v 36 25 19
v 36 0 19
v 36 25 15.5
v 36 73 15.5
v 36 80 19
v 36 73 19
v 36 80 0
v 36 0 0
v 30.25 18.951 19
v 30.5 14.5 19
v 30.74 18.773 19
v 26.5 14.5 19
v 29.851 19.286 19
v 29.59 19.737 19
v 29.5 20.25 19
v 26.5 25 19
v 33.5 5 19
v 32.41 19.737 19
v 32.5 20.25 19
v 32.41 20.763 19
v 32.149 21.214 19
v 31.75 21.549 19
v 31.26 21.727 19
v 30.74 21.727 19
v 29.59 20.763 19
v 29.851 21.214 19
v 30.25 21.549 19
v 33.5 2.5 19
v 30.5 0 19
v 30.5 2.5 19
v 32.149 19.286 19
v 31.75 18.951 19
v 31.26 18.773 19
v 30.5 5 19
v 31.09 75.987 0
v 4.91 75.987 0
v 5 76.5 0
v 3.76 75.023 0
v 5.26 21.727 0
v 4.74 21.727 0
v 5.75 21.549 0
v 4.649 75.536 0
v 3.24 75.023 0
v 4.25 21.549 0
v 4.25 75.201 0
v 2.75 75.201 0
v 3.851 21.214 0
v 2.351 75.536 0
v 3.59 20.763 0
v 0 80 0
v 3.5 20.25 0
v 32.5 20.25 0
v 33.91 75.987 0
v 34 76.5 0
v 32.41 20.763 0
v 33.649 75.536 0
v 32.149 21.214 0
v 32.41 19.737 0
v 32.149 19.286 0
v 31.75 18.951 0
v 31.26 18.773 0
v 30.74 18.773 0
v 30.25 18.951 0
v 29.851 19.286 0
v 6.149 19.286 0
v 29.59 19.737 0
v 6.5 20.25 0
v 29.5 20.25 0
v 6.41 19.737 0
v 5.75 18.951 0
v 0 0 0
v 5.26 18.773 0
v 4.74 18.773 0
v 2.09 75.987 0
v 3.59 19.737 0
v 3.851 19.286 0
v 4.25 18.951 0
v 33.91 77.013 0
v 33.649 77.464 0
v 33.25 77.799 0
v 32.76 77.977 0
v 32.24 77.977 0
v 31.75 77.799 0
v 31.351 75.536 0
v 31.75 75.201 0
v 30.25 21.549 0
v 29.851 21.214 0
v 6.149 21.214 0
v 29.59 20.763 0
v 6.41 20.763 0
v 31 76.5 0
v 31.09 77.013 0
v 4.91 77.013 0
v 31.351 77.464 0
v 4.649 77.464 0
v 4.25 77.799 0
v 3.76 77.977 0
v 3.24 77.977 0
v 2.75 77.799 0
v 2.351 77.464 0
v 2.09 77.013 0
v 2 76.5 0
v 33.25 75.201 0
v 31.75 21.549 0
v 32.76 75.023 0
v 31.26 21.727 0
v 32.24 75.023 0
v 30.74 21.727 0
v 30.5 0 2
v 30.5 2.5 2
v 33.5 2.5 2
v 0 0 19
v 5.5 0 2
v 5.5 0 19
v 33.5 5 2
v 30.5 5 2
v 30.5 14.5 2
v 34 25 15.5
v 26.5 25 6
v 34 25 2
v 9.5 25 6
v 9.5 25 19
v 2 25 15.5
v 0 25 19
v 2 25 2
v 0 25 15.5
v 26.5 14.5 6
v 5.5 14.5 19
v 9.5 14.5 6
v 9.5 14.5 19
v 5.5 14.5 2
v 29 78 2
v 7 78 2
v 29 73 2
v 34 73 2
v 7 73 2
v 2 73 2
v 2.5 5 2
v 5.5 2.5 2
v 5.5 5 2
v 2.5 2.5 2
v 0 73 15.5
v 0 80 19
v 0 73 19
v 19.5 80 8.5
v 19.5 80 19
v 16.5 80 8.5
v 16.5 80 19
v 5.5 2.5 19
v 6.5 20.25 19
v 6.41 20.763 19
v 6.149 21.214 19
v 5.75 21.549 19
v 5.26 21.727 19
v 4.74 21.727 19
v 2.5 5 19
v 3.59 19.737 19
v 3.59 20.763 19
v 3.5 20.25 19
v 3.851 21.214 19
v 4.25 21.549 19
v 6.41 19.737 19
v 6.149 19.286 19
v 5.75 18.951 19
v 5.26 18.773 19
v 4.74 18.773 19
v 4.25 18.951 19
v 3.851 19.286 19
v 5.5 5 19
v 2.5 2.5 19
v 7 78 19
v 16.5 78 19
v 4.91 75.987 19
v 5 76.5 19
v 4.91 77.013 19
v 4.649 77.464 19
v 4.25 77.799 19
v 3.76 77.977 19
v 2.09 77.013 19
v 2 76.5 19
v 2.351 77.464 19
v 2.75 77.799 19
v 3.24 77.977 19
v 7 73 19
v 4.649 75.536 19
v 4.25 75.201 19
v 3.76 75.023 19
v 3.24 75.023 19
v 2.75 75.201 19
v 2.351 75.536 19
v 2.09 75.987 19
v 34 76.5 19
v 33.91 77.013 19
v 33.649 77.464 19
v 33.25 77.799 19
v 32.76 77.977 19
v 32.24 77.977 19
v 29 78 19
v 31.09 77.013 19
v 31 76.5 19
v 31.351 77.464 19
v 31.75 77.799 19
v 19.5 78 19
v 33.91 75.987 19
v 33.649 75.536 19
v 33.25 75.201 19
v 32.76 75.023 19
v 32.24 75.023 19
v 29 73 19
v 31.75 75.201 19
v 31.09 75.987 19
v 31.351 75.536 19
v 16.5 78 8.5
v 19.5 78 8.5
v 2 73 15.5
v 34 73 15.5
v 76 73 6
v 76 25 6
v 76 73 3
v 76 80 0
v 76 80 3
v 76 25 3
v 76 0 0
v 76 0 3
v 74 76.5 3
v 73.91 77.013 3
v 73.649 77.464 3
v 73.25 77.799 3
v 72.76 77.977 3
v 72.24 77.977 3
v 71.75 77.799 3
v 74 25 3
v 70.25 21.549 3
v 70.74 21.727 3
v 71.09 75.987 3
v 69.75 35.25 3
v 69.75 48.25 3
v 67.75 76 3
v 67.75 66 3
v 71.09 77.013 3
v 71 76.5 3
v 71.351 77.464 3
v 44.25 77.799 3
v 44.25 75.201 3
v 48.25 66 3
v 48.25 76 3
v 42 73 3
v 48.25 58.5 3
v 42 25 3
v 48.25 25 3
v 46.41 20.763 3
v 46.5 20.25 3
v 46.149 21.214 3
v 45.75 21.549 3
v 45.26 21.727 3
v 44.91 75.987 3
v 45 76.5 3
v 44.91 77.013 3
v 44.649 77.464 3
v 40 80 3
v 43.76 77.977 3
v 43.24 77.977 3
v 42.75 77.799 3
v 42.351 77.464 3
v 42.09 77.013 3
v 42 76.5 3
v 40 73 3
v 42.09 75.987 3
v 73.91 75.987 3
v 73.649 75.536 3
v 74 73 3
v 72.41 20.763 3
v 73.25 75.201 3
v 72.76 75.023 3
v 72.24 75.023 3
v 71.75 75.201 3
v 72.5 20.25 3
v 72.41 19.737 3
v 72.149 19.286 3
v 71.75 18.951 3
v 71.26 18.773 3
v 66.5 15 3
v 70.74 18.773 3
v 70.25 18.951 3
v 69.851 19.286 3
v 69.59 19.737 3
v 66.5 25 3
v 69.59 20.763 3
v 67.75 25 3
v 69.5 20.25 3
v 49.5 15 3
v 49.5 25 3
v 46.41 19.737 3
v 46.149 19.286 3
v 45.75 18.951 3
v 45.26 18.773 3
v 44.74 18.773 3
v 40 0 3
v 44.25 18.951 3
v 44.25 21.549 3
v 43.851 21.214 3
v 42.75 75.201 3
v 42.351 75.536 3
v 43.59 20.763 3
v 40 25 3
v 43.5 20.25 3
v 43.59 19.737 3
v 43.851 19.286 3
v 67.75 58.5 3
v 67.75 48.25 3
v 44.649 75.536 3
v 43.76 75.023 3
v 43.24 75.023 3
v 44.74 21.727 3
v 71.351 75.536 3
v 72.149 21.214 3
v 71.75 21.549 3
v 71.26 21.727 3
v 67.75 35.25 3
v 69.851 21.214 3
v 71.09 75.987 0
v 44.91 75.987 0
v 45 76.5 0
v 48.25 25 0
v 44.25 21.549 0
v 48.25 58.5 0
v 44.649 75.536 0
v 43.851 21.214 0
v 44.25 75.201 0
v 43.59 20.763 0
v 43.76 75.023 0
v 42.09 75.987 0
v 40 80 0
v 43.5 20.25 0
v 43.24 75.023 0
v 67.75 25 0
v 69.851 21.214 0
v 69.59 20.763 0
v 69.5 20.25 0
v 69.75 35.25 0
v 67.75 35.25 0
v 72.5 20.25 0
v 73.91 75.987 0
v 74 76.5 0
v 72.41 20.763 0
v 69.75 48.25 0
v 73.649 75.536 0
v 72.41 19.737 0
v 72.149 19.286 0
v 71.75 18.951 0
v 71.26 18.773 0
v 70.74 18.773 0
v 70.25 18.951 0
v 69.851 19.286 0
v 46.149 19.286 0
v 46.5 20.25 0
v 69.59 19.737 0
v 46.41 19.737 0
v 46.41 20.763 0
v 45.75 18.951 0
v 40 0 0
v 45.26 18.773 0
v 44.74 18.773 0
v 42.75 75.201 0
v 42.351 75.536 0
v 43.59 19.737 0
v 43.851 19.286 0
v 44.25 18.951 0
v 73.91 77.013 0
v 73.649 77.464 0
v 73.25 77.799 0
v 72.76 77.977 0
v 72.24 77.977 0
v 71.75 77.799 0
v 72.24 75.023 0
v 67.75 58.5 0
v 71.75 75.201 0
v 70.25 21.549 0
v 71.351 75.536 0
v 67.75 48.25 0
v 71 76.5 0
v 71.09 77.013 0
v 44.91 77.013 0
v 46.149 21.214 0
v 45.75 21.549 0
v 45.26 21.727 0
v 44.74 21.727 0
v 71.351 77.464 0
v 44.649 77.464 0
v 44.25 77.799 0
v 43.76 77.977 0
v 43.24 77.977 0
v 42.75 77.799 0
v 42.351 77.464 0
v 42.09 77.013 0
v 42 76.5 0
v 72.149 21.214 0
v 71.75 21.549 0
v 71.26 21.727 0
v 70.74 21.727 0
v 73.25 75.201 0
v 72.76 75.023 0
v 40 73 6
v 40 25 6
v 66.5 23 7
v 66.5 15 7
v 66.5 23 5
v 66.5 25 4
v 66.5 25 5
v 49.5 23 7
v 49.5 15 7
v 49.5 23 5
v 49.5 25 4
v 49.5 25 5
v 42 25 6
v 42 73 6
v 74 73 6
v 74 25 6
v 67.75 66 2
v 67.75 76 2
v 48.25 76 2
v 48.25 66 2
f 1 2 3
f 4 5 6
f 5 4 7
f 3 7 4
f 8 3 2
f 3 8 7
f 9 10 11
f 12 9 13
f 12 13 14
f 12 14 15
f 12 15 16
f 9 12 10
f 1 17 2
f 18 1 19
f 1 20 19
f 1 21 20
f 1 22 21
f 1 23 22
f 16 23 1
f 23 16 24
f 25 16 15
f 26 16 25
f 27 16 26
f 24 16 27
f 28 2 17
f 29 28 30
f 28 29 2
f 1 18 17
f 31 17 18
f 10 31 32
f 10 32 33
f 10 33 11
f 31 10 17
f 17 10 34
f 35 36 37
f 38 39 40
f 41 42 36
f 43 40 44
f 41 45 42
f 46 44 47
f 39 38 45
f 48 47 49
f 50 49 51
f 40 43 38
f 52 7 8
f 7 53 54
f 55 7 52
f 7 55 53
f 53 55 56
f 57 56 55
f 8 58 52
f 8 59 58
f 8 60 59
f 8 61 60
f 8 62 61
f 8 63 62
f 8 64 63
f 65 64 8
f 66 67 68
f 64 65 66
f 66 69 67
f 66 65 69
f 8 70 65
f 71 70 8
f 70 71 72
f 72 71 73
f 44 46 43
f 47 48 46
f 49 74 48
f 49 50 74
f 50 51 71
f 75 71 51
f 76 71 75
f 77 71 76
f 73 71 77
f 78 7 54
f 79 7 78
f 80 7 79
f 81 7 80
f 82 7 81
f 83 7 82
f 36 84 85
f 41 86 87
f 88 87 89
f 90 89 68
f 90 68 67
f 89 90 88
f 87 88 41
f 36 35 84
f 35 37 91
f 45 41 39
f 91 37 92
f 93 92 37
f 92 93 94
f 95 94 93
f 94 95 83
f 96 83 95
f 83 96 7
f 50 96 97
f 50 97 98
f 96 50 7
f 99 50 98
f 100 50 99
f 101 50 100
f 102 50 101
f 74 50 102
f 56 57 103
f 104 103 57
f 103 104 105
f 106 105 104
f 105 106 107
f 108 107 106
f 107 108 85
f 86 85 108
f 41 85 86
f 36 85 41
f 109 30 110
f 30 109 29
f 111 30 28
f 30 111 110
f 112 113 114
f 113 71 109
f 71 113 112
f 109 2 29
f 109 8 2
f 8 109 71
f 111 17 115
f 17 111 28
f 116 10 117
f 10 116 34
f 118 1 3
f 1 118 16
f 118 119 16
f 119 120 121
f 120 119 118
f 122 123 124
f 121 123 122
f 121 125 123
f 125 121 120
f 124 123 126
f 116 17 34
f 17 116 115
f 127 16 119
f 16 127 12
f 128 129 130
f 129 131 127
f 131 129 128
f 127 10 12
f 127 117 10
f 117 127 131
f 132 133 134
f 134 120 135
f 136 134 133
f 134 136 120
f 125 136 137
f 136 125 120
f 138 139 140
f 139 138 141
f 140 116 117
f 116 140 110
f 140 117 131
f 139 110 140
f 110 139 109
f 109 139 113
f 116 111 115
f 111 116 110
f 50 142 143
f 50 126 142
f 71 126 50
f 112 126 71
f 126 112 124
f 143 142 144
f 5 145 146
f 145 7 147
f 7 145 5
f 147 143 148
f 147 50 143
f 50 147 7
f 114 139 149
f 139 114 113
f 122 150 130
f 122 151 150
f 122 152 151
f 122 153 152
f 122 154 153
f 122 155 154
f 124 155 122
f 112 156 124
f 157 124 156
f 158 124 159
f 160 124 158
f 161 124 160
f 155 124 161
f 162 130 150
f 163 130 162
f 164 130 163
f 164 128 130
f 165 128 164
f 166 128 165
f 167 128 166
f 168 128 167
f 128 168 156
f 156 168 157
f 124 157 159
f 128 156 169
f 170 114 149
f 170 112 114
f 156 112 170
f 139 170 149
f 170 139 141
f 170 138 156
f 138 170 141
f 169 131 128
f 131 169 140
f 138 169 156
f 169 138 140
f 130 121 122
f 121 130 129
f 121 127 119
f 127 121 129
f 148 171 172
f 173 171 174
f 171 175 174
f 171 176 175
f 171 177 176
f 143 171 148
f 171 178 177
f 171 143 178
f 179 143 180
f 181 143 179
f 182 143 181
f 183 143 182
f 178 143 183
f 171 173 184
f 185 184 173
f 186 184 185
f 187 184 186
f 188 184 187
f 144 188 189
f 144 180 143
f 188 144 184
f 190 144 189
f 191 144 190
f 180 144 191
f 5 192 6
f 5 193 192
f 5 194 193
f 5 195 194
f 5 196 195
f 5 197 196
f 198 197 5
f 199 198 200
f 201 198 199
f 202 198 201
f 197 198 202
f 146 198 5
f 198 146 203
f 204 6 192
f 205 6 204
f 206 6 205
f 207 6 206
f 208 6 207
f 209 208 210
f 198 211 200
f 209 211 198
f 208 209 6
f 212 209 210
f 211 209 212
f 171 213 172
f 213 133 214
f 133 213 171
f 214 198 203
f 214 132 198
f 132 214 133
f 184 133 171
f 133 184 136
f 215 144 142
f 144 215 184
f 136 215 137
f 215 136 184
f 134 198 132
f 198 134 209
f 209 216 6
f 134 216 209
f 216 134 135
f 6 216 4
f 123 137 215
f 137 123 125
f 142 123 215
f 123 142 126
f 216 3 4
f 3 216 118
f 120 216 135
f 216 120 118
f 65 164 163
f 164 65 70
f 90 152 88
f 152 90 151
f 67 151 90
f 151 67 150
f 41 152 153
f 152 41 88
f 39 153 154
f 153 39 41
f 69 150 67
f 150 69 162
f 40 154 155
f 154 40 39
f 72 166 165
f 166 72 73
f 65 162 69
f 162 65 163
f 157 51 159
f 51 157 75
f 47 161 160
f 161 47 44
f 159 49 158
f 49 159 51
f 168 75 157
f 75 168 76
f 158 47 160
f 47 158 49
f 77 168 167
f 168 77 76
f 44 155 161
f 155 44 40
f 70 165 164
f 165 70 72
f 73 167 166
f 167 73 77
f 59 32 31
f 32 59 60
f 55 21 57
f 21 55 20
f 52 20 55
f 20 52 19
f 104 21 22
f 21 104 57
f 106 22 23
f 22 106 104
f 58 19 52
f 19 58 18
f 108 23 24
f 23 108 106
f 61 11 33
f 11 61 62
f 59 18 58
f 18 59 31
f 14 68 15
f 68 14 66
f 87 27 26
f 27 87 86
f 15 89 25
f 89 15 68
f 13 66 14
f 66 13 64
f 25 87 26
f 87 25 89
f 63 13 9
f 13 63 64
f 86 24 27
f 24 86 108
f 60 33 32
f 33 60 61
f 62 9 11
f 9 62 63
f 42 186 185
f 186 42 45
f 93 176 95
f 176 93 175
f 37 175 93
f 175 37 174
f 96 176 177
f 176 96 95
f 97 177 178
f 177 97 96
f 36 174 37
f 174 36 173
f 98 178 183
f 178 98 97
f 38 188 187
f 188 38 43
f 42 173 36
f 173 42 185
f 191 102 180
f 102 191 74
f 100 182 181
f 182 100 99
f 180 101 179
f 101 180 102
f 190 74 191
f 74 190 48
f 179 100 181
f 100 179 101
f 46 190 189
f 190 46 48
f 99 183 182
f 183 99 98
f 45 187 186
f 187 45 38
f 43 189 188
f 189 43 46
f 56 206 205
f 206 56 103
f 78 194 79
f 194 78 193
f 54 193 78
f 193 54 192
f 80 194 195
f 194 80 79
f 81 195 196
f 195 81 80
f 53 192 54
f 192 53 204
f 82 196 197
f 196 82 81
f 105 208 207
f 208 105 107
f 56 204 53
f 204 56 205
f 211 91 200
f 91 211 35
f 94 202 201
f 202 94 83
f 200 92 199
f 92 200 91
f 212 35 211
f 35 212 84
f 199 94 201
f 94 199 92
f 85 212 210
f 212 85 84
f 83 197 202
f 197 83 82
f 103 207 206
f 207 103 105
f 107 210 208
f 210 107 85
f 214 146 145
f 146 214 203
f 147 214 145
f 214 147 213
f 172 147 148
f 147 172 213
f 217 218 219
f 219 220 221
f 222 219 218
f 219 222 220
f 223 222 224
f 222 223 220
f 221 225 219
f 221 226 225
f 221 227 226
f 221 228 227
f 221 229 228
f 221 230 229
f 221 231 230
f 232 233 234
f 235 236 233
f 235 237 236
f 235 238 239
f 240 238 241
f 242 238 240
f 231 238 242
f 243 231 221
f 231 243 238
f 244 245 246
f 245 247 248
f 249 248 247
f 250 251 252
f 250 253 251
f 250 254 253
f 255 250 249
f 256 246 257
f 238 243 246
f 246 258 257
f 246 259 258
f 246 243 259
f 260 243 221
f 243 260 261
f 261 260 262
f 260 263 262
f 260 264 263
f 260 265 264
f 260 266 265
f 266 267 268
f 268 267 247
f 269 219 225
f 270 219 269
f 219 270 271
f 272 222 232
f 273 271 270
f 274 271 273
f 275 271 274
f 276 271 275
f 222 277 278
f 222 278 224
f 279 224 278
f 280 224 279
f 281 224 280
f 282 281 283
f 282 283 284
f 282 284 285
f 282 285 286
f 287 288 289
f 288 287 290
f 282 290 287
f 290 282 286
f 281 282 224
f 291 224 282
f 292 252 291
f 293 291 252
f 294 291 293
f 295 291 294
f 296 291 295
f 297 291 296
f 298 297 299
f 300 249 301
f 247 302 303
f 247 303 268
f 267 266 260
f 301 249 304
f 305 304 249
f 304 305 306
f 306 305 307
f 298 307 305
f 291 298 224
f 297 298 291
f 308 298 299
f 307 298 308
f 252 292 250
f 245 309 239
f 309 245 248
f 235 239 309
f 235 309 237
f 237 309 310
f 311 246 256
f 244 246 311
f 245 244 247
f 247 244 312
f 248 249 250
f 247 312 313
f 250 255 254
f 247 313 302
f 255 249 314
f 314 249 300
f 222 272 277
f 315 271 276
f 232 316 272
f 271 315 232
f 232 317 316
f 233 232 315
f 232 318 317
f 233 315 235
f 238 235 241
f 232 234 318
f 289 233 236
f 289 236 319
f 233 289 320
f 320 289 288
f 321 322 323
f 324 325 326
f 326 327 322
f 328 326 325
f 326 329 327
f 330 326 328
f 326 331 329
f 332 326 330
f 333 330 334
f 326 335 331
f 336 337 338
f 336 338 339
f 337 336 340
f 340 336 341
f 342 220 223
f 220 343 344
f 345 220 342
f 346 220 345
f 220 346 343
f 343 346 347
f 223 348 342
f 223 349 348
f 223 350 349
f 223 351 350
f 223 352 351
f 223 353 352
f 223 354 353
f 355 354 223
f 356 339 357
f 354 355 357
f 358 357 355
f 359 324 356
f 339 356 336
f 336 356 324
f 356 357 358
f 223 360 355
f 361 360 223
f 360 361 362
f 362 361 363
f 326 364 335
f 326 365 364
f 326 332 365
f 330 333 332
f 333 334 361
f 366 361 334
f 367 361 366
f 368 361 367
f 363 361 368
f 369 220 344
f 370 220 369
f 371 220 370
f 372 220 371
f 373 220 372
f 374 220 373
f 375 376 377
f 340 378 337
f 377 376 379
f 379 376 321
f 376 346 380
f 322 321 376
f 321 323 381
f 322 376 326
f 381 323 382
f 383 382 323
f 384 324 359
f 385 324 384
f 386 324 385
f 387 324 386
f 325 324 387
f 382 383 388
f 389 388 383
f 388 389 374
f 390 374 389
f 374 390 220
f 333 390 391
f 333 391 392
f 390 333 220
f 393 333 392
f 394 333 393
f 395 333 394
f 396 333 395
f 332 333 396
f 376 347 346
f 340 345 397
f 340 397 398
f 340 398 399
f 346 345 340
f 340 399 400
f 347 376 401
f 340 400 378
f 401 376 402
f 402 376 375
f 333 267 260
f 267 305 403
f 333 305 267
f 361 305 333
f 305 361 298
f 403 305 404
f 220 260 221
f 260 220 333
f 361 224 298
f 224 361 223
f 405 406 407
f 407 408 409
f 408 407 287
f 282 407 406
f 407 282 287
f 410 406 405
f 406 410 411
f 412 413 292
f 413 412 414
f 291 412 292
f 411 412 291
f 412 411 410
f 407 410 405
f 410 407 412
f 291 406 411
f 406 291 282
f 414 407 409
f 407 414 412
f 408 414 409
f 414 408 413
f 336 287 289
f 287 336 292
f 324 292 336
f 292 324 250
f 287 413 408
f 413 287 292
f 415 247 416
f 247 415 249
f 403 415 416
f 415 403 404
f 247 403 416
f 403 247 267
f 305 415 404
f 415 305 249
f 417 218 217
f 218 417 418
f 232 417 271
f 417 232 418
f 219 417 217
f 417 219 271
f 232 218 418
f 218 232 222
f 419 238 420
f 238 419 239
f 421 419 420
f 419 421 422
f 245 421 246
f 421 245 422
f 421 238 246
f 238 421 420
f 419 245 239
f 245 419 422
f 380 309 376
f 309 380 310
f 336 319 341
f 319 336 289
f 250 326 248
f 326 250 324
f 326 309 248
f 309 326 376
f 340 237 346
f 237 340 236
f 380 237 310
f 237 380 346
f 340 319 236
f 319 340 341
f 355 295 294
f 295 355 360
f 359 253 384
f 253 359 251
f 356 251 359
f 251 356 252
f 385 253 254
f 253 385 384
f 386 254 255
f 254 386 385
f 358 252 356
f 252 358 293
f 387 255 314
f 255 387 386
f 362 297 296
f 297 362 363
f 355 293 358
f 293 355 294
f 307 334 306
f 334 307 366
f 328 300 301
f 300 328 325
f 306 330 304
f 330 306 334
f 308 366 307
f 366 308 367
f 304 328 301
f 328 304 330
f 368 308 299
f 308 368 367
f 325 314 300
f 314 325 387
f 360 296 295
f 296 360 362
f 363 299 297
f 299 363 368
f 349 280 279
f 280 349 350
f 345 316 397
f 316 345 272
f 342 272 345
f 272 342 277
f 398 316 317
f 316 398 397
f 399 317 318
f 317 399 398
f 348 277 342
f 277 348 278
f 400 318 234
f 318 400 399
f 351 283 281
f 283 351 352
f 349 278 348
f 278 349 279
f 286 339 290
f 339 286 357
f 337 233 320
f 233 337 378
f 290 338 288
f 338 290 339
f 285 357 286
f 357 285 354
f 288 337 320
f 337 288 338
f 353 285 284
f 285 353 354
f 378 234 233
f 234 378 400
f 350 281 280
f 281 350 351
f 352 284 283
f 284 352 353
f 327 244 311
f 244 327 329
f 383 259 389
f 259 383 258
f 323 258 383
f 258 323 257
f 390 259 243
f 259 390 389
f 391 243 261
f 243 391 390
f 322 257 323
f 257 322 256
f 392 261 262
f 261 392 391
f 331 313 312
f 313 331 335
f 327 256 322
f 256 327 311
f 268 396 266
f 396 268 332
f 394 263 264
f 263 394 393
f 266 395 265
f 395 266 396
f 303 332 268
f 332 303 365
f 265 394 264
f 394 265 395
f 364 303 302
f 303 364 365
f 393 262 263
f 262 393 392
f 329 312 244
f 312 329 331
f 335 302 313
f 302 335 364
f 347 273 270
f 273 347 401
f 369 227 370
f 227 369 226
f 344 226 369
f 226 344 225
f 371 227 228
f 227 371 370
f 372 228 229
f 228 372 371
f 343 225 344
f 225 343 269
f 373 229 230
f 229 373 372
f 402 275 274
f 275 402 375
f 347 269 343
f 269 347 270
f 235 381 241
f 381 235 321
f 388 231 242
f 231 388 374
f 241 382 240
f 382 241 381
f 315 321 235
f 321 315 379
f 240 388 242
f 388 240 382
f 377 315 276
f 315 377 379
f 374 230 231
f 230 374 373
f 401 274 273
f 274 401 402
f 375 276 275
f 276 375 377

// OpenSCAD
// -------------------------------------------------
// NES Controller Tester
// by cryxli, August 2022
// -------------------------------------------------

base_plate = 2;     // [mm] How strong to make the bottom of the box
depth = 25;         // [mm] How far the socket reaches into the box
height = 17;        // [mm] Height of the socket
oled_width = 19.5;  // [mm] Width of the OLED display
oled_length = 33.5; // [mm] Length of the OLED display
$fn = 18;           // [faces] Make circles 18 sided polys

// The body of the box
difference() {
	union() {
		// base
		cube([36,depth+48+2+5,base_plate]);
		
		// left side of socket
		cube([5.5,2.5,base_plate+height]);
		cube([2.5,10,base_plate+height]);
		translate([0,5,0]) cube([5.5,depth-5,base_plate+height]);
		translate([0,14.5,0]) cube([9.5,depth-14.5,base_plate+height]);

		// right side of socket
		translate([30.5,0,0]) {
			cube([5.5,2.5,base_plate+height]);
			translate([3,0,0]) cube([2.5,10,base_plate+height]);
			translate([0,5,0]) cube([5.5,depth-5,base_plate+height]);
			translate([-4,14.5,0]) cube([9.5,depth-14.5,base_plate+height]);
		}

		// bottom support for socket
		translate([0,14.5,0]) cube([36,depth-14.5,base_plate+4]);
		
		// back of box
		translate([0,depth+53,0]) cube([36,2,base_plate+height]);
		translate([0,depth+48,0]) cube([7,7,base_plate+height]);
		translate([29,depth+48,0]) cube([7,7,base_plate+height]);
		
		// sides
		cube([2,depth+48+2+5,base_plate+height-3.5]);
		translate([34,0,0]) cube([2,depth+48+2+5,base_plate+height-3.5]);
	}

	// M3 holes behind the socket
	translate([5,depth-4.75,-1]) cylinder(d=3, h=base_plate+height+2);
	translate([31,depth-4.75,-1]) cylinder(d=3, h=base_plate+height+2);
	// M3 holes at the end of the box
	translate([2+1.5,depth+48+2+1.5,-1]) cylinder(d=3, h=base_plate+height+2);
	translate([31+1.5,depth+48+2+1.5,-1]) cylinder(d=3, h=base_plate+height+2);
	
	// slit for USB lead
	translate([(36-3)/2,depth+48+2+5-3,height/2]) cube([3,4,height]);
}


// The lid
translate([40,0,0]) difference() {
	union() {
		// base
		cube([36,depth+48+2+5,3]);
		// register and hold-down for socket
		translate([(36-17)/2,15,0]) cube([17,8,3+4]);
		// with register for ESP
		translate([(36-17)/2,15,0]) cube([17,10,3+2]);
		
		// interlocking sides (0.5mm gap is intentional)
		translate([0,depth,0]) cube([2,48,6]);
		translate([36-2,depth,0]) cube([2,48,6]);
	}
	// space for the micro USB connector and buttons
	translate([(36-oled_width)/2,depth+48+5-12,2]) cube([oled_width,10,2]);
	
	// hole for OLED display and its ribbon
	translate([(36-oled_width)/2,depth,-1]) cube([oled_width,oled_length,5]);
	translate([(36-oled_width)/2+oled_width-1,depth + (oled_length-13)/2,-1]) cube([3,13,5]);
	
	// M3 holes behind the socket
	translate([5,depth-4.75,-1]) cylinder(d=3, h=5);
	translate([31,depth-4.75,-1]) cylinder(d=3, h=5);
	// M3 holes at the end of the box
	translate([2+1.5,depth+48+2+1.5,-1]) cylinder(d=3, h=5);
	translate([31+1.5,depth+48+2+1.5,-1]) cylinder(d=3, h=5);
}
